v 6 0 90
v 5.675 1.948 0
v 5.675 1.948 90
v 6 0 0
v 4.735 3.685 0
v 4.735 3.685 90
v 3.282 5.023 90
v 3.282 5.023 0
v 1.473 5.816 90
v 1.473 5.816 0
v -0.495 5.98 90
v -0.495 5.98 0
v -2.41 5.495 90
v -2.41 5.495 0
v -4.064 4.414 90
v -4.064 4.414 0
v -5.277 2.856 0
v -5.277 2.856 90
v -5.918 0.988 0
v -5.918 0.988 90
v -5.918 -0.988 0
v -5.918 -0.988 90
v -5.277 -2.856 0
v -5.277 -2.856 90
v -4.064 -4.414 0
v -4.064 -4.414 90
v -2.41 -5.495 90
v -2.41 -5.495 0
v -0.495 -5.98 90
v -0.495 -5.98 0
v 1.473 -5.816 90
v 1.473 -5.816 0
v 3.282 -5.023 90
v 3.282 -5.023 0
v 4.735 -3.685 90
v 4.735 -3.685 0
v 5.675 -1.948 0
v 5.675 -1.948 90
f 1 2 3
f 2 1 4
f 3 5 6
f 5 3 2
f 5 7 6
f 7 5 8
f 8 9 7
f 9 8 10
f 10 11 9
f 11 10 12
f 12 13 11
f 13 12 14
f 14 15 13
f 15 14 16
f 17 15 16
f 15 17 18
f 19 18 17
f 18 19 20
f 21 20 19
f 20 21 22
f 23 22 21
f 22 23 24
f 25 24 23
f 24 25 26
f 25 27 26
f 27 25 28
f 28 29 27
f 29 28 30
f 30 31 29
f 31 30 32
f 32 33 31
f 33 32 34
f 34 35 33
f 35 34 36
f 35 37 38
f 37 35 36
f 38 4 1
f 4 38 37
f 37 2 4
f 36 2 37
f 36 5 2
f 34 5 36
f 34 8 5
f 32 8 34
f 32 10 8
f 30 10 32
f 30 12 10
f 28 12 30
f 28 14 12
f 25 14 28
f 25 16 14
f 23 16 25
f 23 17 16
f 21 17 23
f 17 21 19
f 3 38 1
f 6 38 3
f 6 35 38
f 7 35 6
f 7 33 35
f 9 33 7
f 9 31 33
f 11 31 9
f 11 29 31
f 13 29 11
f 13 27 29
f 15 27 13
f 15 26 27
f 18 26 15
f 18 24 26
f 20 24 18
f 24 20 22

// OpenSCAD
module BetaSource() {
    color(.8*[1,1,1]) cylinder(d=12, h=90);
}

BetaSource();
